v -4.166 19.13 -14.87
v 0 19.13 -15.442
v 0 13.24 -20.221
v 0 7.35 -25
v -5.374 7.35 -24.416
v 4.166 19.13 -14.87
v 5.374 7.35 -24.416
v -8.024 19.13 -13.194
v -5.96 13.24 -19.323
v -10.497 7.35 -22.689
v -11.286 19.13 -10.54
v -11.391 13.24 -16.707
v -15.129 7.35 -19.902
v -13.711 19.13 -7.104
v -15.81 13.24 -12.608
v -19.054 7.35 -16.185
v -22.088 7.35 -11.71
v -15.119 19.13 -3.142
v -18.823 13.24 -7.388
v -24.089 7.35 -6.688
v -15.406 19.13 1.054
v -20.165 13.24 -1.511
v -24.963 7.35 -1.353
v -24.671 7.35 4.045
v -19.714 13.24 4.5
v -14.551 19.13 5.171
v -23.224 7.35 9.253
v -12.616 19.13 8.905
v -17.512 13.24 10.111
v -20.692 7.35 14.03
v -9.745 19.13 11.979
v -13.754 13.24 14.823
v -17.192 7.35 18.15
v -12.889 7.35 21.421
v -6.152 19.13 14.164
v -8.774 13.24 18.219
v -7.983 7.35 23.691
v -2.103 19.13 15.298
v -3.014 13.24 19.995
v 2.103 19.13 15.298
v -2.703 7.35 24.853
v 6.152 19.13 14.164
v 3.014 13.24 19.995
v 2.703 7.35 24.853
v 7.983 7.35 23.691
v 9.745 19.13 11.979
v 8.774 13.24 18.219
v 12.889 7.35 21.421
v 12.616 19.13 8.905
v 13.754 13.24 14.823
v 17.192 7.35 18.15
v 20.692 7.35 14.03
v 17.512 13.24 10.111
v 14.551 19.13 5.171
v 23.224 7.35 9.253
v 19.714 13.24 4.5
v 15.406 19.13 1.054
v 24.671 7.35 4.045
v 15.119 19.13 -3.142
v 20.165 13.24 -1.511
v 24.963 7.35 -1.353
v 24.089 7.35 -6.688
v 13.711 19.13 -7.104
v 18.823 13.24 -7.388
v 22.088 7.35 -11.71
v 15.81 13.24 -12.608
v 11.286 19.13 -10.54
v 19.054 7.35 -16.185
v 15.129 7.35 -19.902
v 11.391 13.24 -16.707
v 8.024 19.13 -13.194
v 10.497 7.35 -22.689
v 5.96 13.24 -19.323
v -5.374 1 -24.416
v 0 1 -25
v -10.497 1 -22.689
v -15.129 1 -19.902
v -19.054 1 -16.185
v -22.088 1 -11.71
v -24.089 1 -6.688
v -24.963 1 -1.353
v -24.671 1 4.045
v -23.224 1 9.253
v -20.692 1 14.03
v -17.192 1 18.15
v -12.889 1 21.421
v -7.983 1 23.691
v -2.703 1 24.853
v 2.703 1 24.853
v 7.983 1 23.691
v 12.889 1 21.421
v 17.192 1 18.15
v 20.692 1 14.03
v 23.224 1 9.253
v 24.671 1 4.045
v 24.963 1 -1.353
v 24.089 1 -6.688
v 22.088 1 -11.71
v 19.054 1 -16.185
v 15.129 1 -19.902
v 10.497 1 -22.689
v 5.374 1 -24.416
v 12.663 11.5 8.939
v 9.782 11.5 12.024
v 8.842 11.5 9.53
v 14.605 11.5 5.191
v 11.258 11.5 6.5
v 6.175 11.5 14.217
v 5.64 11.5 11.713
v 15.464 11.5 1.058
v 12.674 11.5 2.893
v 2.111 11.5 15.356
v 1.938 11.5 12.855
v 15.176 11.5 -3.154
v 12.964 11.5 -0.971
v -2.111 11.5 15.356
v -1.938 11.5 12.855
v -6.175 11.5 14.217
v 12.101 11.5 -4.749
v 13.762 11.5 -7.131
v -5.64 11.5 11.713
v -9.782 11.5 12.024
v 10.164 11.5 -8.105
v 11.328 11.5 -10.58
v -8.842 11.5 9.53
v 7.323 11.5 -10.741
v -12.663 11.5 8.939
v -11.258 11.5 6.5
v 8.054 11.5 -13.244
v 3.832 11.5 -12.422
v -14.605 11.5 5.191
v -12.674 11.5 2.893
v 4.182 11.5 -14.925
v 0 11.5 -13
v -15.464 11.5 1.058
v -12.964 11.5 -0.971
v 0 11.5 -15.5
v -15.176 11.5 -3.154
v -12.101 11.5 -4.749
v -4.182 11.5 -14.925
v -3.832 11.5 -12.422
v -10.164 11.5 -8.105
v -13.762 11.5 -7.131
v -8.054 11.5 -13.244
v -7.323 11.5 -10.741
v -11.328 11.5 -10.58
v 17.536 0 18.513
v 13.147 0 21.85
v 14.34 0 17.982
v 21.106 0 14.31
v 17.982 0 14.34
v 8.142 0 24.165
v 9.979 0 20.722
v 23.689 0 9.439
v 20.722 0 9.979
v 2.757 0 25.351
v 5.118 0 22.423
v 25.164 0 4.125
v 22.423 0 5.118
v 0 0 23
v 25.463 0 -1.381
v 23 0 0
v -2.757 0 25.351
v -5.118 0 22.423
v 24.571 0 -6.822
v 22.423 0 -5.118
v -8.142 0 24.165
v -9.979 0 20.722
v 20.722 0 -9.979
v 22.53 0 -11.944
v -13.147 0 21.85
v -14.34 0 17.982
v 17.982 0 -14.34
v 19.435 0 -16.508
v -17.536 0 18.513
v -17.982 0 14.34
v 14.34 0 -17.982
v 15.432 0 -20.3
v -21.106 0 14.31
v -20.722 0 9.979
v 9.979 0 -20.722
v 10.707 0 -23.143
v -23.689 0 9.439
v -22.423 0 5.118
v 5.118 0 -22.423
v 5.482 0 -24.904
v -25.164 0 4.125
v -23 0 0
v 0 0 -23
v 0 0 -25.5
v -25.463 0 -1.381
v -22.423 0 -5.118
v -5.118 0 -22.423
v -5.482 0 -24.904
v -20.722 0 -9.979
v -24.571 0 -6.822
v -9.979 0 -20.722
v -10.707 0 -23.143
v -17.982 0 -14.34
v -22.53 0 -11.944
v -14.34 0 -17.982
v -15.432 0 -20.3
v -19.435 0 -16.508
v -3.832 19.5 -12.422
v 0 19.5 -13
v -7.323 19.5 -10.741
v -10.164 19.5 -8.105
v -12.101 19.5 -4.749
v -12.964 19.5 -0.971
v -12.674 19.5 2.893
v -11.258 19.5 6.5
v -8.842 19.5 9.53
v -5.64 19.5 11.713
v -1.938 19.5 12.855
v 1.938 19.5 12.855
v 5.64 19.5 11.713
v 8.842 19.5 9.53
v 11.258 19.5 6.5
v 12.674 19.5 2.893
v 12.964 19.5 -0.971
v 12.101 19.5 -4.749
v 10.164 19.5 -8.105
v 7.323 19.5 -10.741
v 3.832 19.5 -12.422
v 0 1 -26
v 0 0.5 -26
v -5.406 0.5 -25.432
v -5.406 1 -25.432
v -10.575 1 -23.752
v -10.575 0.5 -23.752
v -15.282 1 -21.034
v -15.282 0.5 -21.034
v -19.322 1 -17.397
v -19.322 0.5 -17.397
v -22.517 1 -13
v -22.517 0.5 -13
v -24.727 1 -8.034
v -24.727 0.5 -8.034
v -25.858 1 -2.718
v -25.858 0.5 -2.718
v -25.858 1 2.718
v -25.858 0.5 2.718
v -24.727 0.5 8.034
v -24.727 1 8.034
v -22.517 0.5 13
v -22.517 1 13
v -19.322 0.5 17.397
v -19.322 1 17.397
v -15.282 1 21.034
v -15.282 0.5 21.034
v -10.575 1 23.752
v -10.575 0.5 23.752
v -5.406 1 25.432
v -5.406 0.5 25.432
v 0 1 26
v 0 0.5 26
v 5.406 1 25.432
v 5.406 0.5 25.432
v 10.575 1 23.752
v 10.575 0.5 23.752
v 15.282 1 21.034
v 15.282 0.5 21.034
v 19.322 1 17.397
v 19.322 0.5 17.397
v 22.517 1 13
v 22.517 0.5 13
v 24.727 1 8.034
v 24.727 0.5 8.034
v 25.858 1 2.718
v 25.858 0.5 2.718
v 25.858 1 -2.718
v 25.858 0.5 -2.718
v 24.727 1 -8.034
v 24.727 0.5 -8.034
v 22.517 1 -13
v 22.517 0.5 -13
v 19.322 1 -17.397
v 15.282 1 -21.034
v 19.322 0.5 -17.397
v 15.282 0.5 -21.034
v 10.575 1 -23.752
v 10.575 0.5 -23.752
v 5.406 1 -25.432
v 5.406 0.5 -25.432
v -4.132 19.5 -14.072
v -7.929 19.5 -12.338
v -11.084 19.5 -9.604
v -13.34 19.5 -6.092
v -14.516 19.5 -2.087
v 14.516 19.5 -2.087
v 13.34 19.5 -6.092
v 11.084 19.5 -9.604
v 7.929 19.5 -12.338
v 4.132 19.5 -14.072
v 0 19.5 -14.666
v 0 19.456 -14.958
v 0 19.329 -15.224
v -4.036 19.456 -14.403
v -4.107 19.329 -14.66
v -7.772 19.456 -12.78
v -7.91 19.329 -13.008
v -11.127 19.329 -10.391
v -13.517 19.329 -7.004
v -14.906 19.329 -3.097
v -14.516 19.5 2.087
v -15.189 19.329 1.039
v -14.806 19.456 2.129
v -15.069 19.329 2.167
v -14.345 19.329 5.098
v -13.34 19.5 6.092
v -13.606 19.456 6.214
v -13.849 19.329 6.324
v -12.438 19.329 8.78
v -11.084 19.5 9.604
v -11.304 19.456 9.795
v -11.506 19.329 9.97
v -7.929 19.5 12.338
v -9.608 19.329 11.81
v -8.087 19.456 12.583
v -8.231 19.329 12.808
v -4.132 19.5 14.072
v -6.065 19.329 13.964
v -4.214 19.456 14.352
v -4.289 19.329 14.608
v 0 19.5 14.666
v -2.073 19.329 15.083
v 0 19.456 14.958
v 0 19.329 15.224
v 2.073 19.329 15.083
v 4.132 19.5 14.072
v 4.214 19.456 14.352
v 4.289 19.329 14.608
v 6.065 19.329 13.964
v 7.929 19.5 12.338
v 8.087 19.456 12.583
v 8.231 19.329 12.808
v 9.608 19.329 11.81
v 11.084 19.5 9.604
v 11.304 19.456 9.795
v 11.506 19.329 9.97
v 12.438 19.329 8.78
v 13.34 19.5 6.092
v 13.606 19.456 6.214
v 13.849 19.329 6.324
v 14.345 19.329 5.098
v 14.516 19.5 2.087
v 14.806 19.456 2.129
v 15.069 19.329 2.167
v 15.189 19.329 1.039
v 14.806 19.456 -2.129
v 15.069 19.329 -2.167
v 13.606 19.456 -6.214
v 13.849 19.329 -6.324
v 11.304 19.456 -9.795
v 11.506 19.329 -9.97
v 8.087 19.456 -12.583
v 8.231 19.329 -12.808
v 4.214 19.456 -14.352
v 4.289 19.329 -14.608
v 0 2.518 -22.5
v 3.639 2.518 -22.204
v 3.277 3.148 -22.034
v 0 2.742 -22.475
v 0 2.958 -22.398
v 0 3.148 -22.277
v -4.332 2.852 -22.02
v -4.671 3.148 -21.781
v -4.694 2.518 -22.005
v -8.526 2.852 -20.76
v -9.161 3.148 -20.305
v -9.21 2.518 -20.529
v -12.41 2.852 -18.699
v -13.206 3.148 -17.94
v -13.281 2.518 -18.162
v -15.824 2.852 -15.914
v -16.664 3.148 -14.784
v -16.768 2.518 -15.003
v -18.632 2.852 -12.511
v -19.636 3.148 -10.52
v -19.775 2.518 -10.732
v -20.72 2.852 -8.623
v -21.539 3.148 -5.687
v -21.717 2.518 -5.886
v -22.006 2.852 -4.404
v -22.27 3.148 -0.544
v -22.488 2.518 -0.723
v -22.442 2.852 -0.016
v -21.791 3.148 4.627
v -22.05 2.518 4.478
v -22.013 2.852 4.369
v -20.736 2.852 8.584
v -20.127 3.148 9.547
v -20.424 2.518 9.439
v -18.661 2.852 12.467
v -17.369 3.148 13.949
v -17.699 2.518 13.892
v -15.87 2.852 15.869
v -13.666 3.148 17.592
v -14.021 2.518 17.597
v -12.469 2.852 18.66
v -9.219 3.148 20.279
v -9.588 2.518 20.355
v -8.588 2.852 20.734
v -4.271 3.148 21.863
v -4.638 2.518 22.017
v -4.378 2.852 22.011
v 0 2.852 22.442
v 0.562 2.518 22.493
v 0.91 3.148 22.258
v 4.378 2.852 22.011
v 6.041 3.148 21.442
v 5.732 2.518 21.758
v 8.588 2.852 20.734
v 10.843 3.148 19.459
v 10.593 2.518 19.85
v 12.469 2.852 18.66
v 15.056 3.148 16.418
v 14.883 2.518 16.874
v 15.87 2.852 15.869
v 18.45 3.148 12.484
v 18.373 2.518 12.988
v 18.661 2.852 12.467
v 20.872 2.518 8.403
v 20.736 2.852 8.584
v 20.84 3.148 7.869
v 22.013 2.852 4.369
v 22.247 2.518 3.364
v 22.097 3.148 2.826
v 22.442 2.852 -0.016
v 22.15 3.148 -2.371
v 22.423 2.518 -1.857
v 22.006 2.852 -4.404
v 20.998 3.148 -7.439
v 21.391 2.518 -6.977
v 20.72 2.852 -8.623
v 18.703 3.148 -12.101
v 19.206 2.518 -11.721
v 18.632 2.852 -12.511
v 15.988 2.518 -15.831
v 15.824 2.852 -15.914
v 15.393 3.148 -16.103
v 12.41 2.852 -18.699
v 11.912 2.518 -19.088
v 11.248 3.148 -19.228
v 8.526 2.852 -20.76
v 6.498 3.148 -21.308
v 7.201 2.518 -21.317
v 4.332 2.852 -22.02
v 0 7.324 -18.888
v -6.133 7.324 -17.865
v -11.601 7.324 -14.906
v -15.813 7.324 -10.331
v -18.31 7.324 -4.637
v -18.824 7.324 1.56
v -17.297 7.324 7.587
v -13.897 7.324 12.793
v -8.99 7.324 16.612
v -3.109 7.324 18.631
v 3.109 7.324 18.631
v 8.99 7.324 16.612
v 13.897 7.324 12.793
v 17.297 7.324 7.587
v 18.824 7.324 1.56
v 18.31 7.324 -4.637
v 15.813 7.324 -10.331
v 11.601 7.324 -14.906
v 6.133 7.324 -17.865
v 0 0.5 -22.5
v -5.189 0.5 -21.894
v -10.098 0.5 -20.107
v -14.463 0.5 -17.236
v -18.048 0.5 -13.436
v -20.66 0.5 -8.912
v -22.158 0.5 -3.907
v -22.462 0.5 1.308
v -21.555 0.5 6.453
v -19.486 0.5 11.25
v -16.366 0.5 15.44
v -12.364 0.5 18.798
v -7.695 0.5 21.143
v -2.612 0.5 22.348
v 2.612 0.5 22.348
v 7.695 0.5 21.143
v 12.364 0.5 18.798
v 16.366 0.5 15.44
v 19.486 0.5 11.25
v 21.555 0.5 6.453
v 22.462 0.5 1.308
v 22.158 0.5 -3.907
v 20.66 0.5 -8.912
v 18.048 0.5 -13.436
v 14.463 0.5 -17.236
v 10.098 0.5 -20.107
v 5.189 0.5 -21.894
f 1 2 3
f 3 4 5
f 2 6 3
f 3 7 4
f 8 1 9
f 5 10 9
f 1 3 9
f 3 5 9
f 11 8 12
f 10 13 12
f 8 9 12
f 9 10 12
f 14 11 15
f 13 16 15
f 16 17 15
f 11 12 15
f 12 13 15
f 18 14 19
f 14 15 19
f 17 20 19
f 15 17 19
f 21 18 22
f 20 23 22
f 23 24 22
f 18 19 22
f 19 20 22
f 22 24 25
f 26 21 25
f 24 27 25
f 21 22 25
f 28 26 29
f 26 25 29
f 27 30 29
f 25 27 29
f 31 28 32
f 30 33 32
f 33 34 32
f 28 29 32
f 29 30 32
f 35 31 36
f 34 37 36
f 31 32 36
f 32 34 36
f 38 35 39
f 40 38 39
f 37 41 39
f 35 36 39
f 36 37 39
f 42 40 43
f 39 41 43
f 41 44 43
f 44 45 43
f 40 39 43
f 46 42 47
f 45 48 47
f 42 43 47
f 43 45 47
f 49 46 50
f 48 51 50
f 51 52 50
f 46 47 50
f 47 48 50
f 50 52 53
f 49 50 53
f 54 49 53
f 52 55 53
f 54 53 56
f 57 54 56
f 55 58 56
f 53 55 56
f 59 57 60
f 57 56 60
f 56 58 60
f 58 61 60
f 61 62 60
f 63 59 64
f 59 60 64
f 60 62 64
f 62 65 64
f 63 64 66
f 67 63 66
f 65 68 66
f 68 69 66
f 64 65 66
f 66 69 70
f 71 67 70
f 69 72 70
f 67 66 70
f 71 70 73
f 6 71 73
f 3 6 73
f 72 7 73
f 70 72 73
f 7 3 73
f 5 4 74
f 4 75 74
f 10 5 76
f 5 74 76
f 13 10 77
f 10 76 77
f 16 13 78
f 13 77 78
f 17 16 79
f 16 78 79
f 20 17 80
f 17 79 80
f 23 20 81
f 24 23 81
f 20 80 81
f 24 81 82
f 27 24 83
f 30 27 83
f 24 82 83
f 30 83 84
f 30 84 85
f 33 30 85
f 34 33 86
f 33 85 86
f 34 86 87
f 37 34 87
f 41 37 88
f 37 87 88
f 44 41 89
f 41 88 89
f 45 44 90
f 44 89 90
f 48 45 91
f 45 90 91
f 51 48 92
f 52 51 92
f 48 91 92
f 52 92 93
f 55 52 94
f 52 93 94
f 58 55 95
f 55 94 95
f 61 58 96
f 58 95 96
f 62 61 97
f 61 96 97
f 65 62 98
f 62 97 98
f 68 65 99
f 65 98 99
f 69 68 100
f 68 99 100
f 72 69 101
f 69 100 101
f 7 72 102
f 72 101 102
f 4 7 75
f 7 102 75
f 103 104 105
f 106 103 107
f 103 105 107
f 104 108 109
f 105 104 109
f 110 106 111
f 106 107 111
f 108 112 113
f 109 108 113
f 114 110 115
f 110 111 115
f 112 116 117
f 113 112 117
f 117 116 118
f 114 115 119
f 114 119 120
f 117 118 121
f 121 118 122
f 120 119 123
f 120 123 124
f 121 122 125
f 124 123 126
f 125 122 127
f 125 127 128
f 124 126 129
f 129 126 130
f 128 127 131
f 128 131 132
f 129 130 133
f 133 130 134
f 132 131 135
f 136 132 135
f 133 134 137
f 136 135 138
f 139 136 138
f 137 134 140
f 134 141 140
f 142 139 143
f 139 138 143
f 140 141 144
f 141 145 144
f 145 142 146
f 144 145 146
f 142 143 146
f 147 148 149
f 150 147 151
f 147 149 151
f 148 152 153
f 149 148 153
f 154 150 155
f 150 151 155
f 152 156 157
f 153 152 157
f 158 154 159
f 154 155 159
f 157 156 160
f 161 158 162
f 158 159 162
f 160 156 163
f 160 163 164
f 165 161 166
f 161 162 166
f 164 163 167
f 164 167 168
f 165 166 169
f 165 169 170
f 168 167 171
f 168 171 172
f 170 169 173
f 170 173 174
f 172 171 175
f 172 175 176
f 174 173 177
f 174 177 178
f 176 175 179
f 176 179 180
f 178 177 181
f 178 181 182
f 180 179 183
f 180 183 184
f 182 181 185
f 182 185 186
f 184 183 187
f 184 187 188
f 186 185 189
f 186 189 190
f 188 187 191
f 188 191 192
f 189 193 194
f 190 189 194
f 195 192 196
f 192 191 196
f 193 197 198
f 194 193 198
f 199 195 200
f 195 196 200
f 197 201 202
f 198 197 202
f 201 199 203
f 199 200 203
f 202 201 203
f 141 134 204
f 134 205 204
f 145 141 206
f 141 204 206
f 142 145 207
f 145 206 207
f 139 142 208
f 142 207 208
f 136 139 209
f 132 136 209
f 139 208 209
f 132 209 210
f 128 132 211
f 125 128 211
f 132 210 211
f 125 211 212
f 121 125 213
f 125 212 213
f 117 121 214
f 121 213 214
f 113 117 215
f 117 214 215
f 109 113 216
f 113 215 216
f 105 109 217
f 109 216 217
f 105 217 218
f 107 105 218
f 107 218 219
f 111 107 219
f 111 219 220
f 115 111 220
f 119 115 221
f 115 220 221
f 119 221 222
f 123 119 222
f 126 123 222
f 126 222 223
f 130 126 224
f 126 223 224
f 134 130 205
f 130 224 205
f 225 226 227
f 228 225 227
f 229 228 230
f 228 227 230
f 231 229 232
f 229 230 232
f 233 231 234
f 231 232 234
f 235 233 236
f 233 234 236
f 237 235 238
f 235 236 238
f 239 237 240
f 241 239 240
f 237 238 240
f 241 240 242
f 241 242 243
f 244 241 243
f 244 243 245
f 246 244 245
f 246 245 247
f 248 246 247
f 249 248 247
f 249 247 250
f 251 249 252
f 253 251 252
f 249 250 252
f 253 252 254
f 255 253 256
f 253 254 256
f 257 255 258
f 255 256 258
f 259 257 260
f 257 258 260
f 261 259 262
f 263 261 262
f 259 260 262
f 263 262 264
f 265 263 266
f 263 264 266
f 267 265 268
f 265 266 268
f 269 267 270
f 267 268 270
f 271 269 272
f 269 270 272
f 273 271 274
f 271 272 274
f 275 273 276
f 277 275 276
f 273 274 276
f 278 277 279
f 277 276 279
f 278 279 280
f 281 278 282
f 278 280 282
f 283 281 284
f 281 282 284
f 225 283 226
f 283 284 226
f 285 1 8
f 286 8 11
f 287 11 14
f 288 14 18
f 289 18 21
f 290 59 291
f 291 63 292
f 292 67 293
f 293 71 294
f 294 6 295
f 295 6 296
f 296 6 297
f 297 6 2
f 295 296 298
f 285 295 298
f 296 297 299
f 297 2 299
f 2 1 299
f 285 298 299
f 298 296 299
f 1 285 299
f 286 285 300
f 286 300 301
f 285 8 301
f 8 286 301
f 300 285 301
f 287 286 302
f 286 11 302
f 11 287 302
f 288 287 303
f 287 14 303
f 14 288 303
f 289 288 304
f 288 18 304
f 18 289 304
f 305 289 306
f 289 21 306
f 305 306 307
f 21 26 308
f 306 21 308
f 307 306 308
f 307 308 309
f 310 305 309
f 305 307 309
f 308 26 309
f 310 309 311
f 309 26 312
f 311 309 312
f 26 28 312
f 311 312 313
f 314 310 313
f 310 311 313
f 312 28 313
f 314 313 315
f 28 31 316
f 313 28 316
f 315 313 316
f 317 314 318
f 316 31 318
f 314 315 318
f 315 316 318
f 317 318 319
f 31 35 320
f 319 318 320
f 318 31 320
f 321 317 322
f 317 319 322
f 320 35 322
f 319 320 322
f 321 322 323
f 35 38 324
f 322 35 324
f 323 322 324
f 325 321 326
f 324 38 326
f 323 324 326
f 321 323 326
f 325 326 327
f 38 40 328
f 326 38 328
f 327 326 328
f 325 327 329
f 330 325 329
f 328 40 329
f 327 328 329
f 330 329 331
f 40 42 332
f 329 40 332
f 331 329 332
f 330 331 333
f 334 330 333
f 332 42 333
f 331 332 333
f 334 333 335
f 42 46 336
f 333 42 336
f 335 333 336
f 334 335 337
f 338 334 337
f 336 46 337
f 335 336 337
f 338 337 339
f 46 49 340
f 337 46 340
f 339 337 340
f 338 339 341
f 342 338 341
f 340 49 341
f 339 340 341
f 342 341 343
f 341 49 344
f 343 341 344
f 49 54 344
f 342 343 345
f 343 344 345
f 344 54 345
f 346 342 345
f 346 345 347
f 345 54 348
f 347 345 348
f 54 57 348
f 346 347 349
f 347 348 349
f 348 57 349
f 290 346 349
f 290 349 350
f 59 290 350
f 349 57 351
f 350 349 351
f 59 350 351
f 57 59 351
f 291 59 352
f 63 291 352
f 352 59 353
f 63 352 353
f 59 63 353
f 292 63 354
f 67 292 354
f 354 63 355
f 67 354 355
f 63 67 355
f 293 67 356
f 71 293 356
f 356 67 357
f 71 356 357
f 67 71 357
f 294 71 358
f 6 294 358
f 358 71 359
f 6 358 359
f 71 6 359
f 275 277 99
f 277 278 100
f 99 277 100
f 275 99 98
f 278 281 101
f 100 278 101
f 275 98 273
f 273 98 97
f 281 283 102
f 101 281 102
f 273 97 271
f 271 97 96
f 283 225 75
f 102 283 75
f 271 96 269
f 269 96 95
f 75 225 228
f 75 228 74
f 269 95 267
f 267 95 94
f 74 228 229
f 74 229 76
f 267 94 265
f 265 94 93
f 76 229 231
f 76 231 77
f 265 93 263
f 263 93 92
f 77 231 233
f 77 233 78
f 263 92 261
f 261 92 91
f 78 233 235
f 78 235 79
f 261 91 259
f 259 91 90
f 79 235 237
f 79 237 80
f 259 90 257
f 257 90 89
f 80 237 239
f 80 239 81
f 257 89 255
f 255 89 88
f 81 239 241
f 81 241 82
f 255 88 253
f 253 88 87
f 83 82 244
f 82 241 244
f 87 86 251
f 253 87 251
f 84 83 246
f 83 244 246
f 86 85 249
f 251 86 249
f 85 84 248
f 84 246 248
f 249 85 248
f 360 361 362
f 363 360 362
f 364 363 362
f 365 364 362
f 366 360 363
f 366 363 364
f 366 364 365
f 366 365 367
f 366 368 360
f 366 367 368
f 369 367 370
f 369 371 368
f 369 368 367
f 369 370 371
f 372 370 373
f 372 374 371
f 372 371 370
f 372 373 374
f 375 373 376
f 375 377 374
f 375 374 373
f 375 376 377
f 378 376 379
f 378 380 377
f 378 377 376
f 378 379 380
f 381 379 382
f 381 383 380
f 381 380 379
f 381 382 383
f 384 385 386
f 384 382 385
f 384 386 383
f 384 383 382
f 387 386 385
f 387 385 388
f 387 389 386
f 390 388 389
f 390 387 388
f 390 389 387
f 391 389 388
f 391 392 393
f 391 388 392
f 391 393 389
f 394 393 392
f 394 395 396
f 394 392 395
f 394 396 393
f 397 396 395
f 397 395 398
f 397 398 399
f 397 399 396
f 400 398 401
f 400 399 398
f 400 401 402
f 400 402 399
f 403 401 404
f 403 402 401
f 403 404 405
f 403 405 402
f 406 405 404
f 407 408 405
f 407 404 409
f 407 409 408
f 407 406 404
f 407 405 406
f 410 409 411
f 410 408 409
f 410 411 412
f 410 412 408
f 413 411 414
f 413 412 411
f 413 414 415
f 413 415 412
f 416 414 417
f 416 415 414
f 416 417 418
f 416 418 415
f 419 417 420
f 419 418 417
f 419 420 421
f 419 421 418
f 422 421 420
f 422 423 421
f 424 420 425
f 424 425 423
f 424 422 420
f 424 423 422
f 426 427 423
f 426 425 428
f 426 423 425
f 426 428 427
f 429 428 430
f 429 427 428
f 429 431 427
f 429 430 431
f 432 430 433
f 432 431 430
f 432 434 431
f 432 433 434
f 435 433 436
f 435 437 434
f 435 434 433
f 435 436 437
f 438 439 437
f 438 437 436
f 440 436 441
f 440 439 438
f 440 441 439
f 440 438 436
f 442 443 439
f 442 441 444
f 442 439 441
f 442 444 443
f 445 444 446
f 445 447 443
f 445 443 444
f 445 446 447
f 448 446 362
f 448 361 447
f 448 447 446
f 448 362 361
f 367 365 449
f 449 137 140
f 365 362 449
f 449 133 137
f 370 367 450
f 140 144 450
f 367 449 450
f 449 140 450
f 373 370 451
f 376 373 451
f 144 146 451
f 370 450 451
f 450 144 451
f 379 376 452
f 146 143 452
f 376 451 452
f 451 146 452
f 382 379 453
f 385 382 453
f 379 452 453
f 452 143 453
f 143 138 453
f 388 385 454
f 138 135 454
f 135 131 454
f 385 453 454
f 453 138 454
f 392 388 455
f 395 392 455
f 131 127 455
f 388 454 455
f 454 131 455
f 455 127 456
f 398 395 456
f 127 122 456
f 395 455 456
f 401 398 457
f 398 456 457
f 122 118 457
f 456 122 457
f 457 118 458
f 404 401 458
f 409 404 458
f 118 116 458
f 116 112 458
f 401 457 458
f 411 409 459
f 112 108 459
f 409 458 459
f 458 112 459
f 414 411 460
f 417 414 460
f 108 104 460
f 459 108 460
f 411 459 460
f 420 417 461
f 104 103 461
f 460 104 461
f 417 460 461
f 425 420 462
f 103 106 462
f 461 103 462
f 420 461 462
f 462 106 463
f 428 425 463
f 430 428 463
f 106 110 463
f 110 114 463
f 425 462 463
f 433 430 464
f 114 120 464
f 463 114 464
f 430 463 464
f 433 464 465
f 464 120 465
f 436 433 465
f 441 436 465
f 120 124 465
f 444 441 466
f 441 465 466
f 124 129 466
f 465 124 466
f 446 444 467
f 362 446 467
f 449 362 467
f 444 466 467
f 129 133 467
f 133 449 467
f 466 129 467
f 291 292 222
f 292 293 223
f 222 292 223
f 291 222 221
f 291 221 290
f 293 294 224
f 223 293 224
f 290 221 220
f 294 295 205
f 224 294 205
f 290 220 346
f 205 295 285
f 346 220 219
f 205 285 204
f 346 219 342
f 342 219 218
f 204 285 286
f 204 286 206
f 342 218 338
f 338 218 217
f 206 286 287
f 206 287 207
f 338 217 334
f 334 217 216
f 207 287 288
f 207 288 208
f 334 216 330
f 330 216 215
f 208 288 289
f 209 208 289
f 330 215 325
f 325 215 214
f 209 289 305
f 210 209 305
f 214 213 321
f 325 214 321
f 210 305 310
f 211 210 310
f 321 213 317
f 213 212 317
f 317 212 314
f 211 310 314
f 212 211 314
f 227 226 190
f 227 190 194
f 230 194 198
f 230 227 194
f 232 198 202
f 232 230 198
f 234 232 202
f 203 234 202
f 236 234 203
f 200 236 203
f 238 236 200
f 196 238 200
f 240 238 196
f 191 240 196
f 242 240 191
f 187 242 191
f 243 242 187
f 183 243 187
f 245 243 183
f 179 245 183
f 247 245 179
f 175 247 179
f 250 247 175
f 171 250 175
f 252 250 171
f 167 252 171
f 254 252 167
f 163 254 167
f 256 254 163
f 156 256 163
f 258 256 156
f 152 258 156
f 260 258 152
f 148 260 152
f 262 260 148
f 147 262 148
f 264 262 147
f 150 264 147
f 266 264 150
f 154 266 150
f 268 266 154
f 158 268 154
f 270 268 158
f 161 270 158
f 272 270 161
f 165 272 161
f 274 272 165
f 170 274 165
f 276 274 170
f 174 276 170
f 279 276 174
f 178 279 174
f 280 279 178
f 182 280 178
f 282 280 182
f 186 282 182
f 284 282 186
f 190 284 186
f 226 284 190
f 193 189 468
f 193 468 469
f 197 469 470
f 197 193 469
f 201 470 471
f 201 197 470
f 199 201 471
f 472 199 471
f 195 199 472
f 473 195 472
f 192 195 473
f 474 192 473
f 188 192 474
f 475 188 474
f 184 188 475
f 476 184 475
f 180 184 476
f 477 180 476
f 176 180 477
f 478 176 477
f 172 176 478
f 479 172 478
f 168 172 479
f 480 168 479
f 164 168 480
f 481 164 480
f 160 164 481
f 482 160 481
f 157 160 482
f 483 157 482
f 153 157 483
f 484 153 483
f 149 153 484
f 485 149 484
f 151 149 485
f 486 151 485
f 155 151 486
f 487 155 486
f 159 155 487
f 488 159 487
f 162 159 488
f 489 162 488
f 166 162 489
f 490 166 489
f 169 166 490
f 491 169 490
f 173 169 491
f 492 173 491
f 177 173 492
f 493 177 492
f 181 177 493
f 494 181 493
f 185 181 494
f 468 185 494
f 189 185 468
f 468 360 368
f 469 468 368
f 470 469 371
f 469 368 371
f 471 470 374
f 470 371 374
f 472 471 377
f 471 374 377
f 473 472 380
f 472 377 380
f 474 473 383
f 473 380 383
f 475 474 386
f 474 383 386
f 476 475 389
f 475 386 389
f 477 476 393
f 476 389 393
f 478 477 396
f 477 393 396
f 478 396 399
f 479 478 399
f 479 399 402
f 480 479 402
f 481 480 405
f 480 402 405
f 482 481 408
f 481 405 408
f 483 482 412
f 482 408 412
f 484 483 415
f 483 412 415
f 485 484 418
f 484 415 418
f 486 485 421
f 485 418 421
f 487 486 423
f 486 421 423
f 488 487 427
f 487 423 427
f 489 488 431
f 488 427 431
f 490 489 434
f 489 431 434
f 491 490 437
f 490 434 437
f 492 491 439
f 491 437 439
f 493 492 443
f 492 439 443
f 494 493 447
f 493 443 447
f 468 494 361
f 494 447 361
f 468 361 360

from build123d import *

# Parameters (mm, degrees)
FILLET1_R     = 1
CHAMFER1_SIZE = 0.5


with BuildPart() as part:
    # Sketch1 → Revolve1 (revolve)
    with BuildSketch(Plane.XY):
        Polygon((-26, 0), (-22.5, 0), (-22.5, 2.872417267), (-15.5, 11.5), (-13, 11.5), (-13, 19.5), (-15.142082361, 19.5), (-25, 7.35), (-25, 1), (-26, 1), align=None)
    revolve(axis=Axis((0, 0, 0), (0, 1, 0)))

    # Fillet1
    fillet1_edges = [part.edges().sort_by_distance(p)[0] for p in [
        (15.142082361, 19.5, 0),
        (22.5, 2.872417267, 0),
    ]]
    fillet(fillet1_edges, radius=FILLET1_R)

    # Chamfer1
    chamfer1_edges = [part.edges().sort_by_distance(p)[0] for p in [
        (22.5, 0, 0),
        (26, 0, 0),
    ]]
    chamfer(chamfer1_edges, length=CHAMFER1_SIZE)


solid = part.part
